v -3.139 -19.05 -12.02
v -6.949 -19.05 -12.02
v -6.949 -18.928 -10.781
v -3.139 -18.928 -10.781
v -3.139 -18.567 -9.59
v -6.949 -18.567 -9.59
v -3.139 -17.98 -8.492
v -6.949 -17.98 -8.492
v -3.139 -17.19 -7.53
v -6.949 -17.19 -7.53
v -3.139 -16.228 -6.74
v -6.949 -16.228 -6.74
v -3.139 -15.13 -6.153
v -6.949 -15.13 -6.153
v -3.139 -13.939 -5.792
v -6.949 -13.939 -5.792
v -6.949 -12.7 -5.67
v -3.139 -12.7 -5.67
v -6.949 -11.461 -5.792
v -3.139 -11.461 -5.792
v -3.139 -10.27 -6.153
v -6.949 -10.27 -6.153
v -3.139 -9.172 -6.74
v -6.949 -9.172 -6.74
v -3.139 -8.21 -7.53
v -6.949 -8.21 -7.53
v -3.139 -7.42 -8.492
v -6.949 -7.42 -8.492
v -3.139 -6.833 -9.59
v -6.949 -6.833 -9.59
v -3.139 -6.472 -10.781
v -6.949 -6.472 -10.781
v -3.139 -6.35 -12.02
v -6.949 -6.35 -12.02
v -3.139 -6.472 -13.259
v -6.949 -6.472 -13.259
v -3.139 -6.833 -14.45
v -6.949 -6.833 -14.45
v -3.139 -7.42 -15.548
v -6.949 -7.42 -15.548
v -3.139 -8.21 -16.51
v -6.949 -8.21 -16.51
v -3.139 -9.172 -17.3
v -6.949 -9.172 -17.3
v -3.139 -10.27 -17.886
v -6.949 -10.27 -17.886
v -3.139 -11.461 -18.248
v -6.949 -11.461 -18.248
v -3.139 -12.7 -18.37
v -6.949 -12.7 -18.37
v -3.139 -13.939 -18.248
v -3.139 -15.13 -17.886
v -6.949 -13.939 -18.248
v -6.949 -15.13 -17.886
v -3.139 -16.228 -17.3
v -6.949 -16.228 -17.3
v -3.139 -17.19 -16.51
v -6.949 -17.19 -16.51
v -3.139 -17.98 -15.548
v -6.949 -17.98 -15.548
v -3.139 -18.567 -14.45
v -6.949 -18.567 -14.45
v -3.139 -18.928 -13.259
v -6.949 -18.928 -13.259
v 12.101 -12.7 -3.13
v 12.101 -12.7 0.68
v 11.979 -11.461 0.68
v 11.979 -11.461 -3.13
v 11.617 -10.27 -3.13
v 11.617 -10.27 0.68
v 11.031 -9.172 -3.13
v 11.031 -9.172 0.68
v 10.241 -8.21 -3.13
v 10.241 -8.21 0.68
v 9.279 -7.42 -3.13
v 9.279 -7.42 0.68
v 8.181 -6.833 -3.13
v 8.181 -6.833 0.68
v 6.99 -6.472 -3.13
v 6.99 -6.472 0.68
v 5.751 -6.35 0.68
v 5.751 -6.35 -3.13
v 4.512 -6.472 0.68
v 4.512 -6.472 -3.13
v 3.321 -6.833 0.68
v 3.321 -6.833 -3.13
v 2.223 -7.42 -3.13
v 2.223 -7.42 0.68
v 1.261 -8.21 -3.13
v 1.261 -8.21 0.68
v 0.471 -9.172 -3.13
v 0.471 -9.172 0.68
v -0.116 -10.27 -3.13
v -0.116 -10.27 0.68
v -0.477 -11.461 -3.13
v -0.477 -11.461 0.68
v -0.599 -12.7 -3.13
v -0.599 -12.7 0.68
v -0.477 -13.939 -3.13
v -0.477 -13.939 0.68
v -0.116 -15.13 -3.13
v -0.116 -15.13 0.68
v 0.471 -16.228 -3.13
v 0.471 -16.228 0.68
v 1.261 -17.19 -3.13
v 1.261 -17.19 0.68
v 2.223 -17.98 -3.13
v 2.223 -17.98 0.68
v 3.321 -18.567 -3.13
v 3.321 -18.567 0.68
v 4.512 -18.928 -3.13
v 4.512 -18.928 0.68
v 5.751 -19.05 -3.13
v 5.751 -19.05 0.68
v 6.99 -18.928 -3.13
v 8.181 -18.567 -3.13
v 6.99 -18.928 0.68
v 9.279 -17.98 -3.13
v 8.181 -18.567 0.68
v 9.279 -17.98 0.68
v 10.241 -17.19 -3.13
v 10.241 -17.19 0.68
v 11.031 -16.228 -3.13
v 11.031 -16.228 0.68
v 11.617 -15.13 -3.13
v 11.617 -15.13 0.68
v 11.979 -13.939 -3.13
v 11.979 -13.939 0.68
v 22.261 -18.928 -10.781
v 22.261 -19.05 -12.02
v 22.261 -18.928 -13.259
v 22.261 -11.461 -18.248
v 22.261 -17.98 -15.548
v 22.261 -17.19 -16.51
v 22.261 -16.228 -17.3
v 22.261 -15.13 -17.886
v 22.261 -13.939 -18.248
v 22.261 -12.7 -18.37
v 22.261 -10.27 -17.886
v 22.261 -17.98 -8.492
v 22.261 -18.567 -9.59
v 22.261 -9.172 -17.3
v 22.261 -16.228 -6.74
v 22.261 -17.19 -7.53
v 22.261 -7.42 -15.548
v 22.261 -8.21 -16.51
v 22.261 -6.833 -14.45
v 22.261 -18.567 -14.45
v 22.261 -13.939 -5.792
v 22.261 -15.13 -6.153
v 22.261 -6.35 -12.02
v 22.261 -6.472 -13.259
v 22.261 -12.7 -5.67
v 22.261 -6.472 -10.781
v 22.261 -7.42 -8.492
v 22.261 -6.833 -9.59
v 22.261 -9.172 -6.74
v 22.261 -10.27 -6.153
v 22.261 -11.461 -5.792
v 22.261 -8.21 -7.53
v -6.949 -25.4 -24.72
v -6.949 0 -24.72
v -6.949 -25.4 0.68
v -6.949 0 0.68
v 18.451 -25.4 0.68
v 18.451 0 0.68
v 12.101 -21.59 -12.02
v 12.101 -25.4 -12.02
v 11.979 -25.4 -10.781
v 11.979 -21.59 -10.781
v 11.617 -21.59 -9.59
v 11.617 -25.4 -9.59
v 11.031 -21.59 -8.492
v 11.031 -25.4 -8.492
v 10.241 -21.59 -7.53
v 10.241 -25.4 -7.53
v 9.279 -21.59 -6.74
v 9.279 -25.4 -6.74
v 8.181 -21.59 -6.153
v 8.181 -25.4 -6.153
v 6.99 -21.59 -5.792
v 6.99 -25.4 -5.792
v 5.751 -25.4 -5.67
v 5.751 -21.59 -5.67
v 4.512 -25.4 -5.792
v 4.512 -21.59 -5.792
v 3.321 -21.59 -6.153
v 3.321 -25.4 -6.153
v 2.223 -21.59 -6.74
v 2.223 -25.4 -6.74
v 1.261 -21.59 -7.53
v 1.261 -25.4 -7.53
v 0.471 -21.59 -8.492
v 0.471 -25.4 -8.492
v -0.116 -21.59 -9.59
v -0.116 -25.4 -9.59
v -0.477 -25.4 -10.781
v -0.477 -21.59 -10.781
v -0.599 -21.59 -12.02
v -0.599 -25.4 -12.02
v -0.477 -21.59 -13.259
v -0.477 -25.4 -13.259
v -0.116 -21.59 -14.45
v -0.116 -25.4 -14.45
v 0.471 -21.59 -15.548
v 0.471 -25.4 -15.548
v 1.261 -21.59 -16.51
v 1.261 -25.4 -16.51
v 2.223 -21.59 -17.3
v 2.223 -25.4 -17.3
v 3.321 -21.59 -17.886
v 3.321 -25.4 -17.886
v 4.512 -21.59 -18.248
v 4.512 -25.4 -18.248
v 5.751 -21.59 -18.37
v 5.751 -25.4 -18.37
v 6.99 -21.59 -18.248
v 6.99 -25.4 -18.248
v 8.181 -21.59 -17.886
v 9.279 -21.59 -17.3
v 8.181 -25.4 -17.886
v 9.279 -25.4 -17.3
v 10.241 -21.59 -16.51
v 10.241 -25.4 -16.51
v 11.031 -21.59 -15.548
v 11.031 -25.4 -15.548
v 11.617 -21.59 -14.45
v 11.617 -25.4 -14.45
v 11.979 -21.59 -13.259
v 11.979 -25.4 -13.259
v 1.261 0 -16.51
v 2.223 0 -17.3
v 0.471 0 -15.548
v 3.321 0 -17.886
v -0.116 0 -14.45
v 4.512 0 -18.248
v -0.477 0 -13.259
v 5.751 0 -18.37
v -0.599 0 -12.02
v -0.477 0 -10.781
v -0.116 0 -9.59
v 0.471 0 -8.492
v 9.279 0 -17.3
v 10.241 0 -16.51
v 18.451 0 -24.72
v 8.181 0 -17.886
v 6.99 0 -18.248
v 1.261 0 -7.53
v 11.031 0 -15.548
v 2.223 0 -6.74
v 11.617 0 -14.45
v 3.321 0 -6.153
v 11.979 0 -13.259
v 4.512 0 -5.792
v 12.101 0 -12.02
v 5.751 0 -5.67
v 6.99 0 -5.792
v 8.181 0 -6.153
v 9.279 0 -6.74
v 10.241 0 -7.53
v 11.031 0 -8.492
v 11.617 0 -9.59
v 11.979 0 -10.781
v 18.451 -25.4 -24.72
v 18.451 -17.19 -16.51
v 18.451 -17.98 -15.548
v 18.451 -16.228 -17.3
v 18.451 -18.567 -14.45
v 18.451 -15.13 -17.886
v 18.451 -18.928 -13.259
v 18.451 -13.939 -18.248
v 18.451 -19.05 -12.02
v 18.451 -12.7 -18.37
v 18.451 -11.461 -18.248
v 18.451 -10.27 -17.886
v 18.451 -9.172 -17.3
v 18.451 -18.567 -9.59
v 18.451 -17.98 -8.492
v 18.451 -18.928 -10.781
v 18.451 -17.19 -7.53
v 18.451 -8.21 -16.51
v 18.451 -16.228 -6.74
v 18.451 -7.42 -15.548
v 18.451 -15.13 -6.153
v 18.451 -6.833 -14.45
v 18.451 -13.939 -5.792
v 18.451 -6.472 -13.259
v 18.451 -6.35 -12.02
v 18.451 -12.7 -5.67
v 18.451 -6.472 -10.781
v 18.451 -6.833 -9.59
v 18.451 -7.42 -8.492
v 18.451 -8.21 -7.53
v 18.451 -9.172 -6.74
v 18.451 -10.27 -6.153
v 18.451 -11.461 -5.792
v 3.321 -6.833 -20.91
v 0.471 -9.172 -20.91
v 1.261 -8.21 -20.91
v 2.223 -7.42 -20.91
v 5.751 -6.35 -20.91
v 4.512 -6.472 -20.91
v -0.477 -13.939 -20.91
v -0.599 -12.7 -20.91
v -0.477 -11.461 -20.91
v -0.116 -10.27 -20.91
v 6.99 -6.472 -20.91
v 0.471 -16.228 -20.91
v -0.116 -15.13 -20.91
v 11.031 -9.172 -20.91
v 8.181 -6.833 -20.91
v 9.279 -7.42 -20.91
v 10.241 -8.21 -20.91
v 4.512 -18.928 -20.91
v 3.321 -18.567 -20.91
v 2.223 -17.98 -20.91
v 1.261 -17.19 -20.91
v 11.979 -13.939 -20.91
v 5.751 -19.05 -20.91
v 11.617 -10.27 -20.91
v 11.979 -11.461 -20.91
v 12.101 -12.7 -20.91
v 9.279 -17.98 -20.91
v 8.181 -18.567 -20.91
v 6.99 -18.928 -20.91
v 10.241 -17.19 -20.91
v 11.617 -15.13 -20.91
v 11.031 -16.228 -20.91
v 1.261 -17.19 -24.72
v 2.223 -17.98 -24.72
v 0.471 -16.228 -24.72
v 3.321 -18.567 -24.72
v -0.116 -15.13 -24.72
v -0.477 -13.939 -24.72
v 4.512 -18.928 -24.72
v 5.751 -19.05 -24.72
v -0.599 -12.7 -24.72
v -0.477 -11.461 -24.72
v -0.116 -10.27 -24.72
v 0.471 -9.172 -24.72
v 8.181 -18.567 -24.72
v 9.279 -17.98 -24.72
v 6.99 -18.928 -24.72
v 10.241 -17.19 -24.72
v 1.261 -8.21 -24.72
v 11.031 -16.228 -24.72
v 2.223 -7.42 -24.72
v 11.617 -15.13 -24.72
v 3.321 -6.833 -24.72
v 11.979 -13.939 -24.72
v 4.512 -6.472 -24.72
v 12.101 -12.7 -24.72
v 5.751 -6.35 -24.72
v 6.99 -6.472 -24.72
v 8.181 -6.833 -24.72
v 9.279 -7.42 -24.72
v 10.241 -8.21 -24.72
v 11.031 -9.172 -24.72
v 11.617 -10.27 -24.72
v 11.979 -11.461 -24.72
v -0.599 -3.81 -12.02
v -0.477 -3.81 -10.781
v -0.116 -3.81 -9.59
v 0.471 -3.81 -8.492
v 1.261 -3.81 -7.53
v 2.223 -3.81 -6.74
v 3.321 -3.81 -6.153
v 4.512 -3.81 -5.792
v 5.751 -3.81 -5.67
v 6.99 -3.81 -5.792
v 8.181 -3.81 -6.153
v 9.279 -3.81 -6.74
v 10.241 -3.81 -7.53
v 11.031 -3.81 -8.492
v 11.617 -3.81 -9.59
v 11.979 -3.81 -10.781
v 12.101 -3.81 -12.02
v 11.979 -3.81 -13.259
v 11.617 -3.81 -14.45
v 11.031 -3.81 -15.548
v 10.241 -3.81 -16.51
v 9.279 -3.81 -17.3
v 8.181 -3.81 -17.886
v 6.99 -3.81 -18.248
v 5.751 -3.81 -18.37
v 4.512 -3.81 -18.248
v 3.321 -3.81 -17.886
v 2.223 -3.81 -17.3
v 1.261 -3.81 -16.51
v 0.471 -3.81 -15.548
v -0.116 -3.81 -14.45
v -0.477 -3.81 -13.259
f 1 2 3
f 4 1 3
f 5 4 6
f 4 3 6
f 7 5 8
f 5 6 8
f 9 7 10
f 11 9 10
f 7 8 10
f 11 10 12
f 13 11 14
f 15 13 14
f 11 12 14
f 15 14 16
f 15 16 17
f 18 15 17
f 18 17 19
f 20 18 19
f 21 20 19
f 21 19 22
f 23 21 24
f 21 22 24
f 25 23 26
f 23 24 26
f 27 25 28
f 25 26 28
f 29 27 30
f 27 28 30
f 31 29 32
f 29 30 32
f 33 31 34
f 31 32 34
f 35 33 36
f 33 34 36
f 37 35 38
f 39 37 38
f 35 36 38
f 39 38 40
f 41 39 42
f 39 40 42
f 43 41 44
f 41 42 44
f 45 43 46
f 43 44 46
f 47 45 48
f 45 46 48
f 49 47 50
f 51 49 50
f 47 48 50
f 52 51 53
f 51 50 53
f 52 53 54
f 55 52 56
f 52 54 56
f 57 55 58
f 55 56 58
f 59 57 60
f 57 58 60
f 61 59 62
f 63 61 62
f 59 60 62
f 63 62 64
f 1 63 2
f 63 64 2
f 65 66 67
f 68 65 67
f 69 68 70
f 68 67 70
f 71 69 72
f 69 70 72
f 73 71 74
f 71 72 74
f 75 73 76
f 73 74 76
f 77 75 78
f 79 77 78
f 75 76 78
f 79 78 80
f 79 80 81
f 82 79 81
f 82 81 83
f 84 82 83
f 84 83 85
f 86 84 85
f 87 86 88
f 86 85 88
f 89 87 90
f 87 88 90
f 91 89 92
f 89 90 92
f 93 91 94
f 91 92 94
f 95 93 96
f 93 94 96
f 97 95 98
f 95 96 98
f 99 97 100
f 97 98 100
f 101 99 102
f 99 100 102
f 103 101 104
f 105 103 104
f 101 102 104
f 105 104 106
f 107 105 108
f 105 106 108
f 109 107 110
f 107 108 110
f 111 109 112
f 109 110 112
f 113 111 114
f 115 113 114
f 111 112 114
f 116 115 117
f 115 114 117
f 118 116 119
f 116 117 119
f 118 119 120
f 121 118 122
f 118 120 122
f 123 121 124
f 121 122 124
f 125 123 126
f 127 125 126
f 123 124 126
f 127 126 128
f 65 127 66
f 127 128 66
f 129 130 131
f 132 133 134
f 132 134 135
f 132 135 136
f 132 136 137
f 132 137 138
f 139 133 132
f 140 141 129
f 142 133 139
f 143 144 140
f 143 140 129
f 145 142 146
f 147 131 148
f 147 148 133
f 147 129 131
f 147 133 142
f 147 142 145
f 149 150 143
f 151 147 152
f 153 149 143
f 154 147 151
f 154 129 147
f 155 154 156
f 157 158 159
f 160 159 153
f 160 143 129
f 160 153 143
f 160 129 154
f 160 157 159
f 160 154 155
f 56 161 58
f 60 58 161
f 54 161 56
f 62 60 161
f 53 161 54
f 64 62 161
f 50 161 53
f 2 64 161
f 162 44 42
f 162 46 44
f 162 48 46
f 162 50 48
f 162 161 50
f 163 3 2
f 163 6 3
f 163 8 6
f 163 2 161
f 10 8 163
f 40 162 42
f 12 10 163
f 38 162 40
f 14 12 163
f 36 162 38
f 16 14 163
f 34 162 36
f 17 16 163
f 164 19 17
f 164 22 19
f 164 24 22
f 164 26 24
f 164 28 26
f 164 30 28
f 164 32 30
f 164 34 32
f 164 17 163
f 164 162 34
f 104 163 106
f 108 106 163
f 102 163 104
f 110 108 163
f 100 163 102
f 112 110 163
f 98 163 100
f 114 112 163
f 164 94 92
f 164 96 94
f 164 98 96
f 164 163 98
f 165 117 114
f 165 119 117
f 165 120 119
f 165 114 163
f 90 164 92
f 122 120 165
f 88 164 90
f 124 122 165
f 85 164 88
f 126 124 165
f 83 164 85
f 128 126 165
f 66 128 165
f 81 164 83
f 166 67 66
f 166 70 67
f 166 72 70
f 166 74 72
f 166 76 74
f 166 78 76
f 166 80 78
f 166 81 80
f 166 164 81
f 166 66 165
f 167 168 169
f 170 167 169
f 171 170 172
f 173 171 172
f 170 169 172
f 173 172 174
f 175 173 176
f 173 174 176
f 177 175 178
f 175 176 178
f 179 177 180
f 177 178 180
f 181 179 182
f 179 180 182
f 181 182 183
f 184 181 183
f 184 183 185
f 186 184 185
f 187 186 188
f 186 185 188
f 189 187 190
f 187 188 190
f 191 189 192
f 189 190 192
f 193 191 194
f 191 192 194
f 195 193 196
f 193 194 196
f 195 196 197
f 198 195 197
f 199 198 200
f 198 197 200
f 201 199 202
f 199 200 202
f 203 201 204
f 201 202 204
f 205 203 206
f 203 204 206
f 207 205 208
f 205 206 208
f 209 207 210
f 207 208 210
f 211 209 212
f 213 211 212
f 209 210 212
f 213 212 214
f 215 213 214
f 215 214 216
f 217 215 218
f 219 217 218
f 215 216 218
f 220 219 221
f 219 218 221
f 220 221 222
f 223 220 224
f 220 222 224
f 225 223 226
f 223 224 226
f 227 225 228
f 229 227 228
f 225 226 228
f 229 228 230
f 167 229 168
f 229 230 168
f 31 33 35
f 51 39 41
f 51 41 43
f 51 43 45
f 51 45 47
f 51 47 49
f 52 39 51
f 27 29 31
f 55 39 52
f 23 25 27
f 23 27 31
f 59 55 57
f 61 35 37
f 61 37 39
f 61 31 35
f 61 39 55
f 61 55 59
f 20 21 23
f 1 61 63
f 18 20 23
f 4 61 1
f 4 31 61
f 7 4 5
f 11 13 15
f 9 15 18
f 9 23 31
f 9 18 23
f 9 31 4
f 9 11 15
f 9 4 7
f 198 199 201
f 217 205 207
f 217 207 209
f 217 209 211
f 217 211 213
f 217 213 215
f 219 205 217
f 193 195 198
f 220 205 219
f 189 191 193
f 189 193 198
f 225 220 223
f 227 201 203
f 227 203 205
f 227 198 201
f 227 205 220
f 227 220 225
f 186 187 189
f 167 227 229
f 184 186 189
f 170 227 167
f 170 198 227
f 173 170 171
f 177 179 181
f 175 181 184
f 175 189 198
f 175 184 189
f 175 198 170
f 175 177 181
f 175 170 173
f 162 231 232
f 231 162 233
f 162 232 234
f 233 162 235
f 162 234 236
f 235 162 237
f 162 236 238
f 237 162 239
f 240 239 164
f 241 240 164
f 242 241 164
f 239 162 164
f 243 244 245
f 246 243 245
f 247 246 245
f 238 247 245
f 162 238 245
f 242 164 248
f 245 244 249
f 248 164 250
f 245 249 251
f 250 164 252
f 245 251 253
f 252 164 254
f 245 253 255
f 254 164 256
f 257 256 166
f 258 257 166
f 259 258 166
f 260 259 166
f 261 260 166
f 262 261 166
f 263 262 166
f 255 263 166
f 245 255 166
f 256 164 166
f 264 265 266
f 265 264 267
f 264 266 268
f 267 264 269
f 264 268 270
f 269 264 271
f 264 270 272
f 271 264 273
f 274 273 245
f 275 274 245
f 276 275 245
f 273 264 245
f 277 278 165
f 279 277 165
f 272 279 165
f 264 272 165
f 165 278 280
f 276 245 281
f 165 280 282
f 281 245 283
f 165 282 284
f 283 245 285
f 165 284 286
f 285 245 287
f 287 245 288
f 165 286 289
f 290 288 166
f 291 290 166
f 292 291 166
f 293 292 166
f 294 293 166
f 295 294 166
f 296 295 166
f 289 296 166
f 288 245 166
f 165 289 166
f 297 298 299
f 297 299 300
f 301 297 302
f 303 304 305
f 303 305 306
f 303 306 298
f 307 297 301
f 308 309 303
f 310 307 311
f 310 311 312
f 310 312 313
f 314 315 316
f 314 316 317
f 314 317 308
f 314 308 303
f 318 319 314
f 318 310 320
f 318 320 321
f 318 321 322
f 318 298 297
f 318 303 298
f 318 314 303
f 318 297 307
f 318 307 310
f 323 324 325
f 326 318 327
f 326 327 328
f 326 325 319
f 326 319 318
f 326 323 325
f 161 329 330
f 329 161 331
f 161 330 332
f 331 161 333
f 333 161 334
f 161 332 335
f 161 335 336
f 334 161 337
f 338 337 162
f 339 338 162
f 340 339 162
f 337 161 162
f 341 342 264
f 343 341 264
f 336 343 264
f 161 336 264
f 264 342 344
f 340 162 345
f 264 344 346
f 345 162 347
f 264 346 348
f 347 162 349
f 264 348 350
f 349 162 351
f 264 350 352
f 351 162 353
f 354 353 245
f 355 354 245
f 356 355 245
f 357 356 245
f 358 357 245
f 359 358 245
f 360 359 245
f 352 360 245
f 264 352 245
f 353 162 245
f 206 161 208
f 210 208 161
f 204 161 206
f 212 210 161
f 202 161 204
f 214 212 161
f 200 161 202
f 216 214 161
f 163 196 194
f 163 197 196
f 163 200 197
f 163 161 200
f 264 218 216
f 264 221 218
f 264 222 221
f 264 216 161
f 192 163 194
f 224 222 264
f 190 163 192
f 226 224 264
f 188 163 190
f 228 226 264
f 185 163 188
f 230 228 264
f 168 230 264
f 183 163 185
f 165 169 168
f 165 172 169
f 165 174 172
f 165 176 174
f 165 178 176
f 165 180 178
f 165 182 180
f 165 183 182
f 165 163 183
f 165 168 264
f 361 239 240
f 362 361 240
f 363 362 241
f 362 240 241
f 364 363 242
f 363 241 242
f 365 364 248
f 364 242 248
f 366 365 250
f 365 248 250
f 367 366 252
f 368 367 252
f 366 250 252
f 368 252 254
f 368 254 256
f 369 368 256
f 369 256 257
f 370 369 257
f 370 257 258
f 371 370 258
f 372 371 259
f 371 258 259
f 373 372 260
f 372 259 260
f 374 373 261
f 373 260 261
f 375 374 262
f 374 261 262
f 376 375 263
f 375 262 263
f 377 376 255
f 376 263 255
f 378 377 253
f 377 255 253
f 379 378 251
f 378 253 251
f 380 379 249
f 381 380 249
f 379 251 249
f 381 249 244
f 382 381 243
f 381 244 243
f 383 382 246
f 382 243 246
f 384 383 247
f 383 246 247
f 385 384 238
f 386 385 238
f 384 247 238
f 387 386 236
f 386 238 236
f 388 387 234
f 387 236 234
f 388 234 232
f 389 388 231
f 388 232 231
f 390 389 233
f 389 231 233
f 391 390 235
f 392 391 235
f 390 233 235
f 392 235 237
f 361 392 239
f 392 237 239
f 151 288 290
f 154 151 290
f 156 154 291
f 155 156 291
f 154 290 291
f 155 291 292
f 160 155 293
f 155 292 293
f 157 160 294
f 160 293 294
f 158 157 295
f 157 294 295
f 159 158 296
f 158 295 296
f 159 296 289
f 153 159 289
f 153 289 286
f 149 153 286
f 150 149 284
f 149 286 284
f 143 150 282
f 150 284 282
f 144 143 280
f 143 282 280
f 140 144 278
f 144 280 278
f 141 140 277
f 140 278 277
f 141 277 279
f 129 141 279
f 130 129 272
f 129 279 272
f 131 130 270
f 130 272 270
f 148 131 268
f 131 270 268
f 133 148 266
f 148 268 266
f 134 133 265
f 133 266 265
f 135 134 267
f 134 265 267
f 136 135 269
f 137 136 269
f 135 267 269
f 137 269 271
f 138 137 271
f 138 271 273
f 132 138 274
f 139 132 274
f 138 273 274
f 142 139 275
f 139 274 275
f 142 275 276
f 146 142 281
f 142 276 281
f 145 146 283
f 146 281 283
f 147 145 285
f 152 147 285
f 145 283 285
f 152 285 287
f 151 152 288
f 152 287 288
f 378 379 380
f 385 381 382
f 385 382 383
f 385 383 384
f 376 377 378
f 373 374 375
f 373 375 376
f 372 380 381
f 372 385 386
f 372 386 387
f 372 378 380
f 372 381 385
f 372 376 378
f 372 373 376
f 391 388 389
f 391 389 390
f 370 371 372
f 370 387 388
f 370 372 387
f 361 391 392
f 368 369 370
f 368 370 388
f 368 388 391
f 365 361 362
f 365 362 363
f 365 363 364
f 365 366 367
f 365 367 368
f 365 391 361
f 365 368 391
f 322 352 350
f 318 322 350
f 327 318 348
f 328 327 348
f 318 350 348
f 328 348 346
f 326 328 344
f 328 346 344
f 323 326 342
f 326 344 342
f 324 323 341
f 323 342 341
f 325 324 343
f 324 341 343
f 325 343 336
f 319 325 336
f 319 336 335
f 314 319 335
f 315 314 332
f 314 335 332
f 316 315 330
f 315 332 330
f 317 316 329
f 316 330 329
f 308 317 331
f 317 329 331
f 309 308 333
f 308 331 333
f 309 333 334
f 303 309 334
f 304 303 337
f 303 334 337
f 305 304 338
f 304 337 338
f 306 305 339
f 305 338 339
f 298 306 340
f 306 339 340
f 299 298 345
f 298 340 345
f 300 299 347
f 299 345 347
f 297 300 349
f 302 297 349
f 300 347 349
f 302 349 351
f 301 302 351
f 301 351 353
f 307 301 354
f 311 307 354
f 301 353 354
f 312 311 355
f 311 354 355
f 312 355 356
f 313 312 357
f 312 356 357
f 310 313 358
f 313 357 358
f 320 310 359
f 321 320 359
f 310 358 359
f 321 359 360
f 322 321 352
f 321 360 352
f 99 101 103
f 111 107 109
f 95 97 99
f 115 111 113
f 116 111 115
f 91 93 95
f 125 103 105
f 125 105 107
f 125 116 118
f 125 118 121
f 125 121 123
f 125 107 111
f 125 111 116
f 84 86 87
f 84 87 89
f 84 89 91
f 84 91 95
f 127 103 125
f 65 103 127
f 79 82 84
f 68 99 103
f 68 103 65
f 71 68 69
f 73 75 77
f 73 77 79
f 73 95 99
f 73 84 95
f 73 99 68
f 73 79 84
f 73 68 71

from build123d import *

# Parameters (mm, degrees)
F0_W      = 25.4
F0_H      = 25.4
F1_DEPTH  = 25.4
F7_R      = 6.35
F8_DEPTH  = 3.81
F6_R      = 6.35
F9_DEPTH  = 3.81
F5_R      = 6.35
F10_DEPTH = 3.81
F4_R      = 6.35
F11_DEPTH = 3.81
F3_R      = 6.35
F12_DEPTH = 3.81
F2_R      = 6.35
F13_DEPTH = 3.81


with BuildPart() as f1:
    # F0 (on Front) → F1 (new body)
    with BuildSketch(Plane.XZ):
        with Locations((5.750718, -12.019807)):
            Rectangle(F0_W, F0_H)
    extrude(amount=F1_DEPTH)

    # F7 (on face) → F8 (cut)
    with BuildSketch(Plane(origin=(0, 0, 0), x_dir=(-1, 0, 0), z_dir=(0, 1, 0))):
        with Locations((-5.750718, -12.019807)):
            Circle(F7_R)
    extrude(amount=-F8_DEPTH, mode=Mode.SUBTRACT)

    # F6 (on face) → F9 (cut)
    with BuildSketch(Plane(origin=(-6.949282, 0, 0), x_dir=(0, -1, 0), z_dir=(-1, 0, 0))):
        with Locations((12.7, -12.019807)):
            Circle(F6_R)
    extrude(amount=-F9_DEPTH, mode=Mode.SUBTRACT)

    # F5 (on face) → F10 (cut)
    with BuildSketch(Plane.XY.offset(0.680193)):
        with Locations((5.75072, -12.7)):
            Circle(F5_R)
    extrude(amount=-F10_DEPTH, mode=Mode.SUBTRACT)

    # F4 (on face) → F11 (join)
    with BuildSketch(Plane.YZ.offset(18.450718)):
        with Locations((-12.7, -12.019807)):
            Circle(F4_R)
    extrude(amount=F11_DEPTH)

    # F3 (on face) → F12 (cut)
    with BuildSketch(Plane(origin=(0, 0, -24.719807), x_dir=(1, 0, 0), z_dir=(0, 0, -1))):
        with Locations((5.750718, 12.7)):
            Circle(F3_R)
    extrude(amount=-F12_DEPTH, mode=Mode.SUBTRACT)

    # F2 (on face) → F13 (cut)
    with BuildSketch(Plane.XZ.offset(25.4)):
        with Locations((5.750718, -12.019807)):
            Circle(F2_R)
    extrude(amount=-F13_DEPTH, mode=Mode.SUBTRACT)


solid = f1.part
